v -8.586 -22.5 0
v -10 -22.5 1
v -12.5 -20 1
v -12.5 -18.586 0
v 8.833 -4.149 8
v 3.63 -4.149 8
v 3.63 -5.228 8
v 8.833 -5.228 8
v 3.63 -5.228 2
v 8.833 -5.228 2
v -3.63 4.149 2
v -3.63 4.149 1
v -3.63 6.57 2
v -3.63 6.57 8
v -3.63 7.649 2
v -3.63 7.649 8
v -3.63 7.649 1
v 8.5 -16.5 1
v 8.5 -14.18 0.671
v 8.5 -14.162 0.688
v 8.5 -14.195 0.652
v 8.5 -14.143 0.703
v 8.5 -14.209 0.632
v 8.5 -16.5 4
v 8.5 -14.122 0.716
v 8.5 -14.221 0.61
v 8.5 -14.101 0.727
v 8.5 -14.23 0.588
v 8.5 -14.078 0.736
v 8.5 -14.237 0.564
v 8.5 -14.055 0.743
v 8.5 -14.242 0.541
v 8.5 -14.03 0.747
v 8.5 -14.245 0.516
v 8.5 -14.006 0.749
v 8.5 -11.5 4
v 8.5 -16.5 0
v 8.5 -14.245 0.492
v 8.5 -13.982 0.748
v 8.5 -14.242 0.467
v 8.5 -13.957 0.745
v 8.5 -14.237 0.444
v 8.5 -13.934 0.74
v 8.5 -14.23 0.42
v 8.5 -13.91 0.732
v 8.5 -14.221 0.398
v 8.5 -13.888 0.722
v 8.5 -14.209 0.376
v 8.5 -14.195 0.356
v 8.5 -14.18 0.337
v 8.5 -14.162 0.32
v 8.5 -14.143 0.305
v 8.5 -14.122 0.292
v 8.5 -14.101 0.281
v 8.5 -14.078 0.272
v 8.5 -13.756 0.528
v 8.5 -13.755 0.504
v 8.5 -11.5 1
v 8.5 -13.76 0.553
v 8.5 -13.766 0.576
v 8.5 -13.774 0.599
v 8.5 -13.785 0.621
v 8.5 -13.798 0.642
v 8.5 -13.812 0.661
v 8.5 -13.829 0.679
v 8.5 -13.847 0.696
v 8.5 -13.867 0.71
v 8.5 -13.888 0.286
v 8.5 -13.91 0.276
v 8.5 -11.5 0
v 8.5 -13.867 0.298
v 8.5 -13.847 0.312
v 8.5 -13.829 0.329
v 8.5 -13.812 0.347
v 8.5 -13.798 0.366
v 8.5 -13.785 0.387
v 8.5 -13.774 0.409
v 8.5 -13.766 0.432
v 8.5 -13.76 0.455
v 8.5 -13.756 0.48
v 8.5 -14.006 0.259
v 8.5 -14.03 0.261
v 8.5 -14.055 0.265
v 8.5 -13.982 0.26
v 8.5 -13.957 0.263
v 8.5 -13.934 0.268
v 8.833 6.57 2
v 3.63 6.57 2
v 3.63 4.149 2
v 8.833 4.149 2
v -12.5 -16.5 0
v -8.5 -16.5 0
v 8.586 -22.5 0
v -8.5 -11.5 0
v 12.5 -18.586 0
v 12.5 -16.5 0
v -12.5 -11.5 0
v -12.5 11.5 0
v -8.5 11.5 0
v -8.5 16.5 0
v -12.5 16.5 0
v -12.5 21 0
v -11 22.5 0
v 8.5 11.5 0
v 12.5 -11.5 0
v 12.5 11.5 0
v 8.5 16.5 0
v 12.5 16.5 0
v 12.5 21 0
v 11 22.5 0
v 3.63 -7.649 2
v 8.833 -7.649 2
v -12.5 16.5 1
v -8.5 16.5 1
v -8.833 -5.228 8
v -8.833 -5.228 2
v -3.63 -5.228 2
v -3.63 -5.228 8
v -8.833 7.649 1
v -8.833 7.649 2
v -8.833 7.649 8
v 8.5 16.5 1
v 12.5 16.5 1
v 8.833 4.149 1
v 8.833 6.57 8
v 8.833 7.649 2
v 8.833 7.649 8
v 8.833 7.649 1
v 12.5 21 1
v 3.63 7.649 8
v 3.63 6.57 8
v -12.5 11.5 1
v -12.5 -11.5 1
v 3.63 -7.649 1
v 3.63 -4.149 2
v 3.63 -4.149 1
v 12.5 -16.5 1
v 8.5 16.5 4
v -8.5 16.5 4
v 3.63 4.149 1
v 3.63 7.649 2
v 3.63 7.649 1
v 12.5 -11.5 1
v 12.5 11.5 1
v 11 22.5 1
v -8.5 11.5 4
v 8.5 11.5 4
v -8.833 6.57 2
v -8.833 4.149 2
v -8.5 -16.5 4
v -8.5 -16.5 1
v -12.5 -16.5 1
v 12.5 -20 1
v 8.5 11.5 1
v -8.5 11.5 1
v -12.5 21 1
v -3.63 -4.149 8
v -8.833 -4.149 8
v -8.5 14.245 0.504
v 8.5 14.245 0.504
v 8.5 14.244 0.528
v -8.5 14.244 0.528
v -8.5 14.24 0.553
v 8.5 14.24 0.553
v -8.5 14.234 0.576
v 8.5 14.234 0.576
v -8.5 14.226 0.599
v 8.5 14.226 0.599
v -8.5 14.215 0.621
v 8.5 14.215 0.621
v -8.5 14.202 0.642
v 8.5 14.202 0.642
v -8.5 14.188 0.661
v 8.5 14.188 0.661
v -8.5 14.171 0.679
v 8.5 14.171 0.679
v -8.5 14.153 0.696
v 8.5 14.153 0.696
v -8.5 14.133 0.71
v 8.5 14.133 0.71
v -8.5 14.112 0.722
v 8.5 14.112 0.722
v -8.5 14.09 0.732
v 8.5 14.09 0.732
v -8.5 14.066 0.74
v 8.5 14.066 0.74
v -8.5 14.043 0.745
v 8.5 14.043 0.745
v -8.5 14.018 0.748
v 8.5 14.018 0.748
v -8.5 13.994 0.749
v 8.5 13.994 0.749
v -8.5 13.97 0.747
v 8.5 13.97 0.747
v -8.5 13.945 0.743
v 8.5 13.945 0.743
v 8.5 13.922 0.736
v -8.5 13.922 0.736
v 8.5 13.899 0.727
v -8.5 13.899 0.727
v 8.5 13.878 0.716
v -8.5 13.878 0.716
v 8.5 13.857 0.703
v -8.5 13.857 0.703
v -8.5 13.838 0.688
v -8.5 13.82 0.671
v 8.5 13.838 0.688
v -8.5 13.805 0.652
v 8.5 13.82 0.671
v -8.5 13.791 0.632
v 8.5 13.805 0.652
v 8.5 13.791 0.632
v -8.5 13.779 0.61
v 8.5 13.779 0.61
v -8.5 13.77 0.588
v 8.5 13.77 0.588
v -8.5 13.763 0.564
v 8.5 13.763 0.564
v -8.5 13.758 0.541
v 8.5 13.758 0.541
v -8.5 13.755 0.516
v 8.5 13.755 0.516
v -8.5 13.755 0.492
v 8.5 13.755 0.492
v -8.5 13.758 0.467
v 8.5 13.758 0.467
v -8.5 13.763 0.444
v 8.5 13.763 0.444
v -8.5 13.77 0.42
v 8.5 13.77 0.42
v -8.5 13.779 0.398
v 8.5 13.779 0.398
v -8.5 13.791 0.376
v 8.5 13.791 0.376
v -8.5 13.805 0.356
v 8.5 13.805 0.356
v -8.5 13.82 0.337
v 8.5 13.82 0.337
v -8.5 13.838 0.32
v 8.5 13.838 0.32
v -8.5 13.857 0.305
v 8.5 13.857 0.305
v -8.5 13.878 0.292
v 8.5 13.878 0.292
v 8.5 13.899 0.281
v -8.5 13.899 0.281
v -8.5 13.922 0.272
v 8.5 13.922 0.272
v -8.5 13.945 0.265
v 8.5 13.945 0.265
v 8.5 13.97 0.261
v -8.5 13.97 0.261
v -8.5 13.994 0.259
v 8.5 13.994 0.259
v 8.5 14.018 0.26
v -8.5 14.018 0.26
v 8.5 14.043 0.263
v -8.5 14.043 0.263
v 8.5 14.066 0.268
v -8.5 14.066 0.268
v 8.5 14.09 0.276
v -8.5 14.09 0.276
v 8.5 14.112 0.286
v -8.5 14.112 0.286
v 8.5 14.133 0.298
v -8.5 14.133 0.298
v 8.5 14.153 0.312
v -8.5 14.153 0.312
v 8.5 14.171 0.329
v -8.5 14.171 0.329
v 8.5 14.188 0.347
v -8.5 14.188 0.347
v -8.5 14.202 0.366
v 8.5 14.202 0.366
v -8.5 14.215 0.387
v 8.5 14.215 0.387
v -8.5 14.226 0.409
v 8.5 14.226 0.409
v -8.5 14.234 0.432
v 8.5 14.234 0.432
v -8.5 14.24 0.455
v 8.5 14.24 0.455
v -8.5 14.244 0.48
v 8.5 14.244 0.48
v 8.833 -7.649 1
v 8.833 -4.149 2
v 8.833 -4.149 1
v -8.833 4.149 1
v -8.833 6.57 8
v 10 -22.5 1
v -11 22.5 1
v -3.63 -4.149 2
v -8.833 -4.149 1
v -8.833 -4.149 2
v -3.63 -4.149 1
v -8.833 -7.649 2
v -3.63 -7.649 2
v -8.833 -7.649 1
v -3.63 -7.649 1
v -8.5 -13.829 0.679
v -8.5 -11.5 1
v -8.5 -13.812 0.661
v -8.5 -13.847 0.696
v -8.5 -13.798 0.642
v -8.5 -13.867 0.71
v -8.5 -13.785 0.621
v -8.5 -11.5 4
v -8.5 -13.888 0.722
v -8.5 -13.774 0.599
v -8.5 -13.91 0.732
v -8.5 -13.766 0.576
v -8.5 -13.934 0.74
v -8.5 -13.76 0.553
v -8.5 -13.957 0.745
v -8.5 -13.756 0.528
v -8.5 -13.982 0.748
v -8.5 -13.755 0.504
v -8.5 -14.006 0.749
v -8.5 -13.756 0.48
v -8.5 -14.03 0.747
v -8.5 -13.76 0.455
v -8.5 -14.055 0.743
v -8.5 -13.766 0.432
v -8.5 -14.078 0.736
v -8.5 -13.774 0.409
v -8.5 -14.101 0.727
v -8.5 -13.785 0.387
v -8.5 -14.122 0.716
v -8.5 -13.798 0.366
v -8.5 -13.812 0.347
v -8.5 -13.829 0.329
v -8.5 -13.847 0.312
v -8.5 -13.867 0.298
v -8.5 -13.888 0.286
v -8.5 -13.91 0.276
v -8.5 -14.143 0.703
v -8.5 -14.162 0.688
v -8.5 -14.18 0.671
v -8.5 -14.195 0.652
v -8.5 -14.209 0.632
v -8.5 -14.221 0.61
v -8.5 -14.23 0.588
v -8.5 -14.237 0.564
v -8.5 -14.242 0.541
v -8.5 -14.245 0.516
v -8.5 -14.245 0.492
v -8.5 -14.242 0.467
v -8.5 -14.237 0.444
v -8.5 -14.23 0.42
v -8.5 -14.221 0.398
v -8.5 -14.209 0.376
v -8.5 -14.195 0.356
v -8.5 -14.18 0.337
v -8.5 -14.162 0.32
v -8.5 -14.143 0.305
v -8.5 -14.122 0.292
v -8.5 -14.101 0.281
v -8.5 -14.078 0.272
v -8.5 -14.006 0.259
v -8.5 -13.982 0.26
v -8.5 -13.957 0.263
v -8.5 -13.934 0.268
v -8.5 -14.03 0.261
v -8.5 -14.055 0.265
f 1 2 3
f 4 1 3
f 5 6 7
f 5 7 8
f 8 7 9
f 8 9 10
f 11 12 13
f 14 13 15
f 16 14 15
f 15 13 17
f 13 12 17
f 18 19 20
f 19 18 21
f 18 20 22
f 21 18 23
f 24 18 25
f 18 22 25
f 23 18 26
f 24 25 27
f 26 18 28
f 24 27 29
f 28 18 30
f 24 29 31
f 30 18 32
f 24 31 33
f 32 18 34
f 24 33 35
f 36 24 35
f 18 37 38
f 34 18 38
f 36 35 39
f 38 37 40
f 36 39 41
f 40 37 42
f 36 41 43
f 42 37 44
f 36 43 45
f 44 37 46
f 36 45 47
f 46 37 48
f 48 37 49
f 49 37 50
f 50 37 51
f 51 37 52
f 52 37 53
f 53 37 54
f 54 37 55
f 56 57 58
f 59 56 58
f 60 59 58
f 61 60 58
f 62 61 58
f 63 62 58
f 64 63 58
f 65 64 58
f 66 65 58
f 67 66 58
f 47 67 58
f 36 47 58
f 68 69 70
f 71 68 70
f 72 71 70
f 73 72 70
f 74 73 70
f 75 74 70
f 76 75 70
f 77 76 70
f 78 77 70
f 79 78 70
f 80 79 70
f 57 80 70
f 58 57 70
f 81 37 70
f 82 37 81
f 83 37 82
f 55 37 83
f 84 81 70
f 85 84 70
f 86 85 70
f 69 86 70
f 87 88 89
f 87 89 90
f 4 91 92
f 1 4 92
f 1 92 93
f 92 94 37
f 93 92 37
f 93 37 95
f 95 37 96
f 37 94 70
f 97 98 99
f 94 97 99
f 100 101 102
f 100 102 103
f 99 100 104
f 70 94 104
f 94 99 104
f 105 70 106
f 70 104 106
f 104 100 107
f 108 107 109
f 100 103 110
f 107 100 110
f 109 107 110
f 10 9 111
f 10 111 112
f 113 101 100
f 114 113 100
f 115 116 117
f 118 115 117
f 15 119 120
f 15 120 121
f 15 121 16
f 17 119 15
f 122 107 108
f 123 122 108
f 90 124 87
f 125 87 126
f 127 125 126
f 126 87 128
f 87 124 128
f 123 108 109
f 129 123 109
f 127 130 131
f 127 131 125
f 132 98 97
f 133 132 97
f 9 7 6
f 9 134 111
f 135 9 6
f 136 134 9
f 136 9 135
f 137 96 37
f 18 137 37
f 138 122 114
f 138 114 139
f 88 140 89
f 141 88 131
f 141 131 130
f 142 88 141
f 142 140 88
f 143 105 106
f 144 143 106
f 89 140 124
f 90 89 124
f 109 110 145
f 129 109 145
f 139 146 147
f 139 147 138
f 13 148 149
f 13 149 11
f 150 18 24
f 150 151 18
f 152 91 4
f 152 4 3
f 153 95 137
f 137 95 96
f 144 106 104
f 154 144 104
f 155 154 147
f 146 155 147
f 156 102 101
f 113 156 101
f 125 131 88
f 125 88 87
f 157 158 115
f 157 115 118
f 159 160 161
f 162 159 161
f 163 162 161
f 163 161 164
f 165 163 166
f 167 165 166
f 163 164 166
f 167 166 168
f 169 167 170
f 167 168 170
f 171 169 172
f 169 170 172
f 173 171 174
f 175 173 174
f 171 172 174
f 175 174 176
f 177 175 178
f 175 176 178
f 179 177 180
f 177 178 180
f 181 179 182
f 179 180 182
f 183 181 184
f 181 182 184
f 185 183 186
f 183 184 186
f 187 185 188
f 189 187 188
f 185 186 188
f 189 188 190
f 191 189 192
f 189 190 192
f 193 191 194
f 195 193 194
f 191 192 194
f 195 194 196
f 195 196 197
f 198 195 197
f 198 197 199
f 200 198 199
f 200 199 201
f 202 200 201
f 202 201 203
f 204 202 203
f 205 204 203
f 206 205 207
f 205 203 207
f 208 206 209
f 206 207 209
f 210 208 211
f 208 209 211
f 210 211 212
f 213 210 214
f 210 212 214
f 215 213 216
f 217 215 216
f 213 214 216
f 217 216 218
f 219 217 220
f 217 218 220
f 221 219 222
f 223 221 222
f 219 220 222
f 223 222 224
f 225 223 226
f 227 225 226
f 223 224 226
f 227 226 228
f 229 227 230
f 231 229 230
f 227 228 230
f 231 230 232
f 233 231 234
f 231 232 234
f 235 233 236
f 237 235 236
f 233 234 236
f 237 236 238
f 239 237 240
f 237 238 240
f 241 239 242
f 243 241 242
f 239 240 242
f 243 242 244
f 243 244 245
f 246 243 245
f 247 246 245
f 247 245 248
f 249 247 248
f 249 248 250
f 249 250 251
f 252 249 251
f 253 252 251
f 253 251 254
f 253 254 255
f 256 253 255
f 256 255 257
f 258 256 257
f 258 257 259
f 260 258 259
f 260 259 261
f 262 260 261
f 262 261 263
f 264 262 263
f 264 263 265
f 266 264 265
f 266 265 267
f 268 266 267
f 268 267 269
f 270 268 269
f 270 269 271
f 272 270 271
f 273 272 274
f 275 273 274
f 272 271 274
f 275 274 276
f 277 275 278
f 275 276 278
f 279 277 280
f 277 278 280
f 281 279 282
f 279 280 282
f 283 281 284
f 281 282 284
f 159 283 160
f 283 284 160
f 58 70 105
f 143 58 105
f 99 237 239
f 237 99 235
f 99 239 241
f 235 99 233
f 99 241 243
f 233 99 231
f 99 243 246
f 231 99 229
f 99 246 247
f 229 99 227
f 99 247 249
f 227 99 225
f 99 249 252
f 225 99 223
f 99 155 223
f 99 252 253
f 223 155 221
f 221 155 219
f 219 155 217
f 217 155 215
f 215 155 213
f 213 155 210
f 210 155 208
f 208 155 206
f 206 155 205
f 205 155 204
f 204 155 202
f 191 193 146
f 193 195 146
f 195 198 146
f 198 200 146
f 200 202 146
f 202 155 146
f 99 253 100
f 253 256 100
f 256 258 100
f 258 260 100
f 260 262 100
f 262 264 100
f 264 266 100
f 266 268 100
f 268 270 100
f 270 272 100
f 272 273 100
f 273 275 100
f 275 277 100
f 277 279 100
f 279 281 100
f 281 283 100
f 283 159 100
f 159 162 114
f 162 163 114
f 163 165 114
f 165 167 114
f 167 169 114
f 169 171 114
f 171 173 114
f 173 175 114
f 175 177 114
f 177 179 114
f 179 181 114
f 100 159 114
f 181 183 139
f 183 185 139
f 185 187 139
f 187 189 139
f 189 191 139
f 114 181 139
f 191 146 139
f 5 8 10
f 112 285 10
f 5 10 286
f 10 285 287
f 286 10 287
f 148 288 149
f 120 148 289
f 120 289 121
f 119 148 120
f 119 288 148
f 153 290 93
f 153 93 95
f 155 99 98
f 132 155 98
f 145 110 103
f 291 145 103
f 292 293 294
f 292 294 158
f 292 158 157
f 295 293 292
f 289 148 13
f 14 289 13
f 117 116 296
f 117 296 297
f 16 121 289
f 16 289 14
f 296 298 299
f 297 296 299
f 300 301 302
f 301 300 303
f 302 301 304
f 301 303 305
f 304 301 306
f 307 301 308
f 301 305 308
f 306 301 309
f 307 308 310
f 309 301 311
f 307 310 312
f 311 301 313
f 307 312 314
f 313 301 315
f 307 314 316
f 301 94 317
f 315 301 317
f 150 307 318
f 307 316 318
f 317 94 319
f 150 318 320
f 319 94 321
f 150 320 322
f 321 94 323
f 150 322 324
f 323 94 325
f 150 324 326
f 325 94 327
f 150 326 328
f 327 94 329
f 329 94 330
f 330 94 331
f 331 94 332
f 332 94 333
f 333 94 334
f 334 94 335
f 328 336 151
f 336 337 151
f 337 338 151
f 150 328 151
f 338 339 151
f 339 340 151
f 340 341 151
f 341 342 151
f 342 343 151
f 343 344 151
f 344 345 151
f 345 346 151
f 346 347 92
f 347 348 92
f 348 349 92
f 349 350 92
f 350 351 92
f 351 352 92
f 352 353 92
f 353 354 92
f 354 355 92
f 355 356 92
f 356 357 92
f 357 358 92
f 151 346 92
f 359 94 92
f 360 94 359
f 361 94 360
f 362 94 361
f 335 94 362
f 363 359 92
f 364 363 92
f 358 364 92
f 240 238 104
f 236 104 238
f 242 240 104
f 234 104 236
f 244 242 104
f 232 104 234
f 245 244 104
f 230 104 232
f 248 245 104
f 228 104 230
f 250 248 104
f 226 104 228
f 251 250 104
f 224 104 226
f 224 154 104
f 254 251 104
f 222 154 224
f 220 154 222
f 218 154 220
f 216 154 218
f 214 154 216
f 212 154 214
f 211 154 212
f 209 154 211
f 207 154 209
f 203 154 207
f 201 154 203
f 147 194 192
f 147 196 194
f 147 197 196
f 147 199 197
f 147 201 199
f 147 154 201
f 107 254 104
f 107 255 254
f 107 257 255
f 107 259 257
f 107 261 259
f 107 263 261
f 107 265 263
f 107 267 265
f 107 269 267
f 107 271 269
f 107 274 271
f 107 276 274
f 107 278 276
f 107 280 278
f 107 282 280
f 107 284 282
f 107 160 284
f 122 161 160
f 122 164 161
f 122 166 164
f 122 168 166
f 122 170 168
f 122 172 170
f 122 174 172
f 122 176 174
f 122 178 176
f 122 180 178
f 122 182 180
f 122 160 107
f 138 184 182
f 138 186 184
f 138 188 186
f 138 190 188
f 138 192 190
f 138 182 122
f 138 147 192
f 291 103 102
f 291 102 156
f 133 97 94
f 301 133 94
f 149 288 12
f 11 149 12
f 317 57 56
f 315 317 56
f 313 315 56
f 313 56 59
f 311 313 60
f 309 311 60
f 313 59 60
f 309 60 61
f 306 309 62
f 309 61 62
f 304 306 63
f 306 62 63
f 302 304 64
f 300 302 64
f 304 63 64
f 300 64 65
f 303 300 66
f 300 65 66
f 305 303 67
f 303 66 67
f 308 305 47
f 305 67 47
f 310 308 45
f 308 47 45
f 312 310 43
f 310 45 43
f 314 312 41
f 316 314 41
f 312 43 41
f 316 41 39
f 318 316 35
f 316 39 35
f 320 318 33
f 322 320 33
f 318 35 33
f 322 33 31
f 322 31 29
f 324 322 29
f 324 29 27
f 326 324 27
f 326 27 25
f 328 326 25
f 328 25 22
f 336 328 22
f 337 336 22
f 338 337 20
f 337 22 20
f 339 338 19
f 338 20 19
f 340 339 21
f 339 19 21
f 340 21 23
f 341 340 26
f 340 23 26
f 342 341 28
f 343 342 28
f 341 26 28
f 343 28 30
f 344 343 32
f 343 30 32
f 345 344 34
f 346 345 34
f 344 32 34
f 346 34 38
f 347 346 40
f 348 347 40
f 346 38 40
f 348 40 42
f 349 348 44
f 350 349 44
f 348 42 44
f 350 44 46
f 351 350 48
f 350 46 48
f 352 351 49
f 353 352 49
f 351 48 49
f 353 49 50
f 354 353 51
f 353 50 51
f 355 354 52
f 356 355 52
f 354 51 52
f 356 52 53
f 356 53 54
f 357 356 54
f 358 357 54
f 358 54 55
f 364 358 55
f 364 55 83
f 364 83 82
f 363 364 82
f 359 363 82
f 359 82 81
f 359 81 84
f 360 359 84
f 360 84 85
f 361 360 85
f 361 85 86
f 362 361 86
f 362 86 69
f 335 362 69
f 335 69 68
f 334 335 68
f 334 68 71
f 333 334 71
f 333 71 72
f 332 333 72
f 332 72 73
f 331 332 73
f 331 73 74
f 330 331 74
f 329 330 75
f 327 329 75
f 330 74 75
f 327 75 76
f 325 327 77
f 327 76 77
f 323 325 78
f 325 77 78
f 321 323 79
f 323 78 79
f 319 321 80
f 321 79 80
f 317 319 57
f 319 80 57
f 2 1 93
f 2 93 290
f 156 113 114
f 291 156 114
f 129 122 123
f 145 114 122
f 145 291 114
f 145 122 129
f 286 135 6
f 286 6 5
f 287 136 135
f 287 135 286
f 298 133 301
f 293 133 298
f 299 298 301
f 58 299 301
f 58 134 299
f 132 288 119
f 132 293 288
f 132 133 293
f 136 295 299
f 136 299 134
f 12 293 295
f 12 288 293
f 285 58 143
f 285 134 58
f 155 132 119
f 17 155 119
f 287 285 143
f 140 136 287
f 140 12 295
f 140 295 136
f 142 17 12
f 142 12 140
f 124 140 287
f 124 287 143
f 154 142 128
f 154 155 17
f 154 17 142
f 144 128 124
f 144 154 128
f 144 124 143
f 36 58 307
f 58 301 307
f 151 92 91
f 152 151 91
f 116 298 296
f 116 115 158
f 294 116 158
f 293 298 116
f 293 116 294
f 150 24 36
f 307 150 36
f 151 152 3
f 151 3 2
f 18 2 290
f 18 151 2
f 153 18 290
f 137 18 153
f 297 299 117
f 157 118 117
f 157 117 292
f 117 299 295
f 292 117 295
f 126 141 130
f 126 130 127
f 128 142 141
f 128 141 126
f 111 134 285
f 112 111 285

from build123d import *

# Parameters (mm, degrees)
F1_DEPTH  = 1
F2_W      = 5
F2_H      = 3
F3_DEPTH  = 8.5
F4_SIZE   = 2.5
F5_SIZE   = 1.5
F6_SIZE   = 0.99999
F7_R      = 0.245
F8_DEPTH  = 17
F9_W      = 5.2027019071
F9_H      = 3.5
F10_DEPTH = 1
F11_W     = 5.2027019071
F11_H     = 1.0782994613
F12_DEPTH = 6
F13_W     = 5.2027019071
F13_H     = 1.0795953252
F14_DEPTH = 6


# Not quite as in the source:
# - a fillet or chamfer is up to 0.001 mm smaller than in the source, because OpenCascade refuses the exact size


with BuildPart() as f1:
    # F0 (on Top) → F1 (new body)
    with BuildSketch(Plane.XY):
        Polygon((-12.5, -22.5), (12.5, -22.5), (12.5, -16.5), (8.5, -16.5), (8.5, -11.5), (12.5, -11.5), (12.5, 11.5), (8.5, 11.5), (8.5, 16.5), (12.5, 16.5), (12.5, 22.5), (-12.5, 22.5), (-12.5, 16.5), (-8.5, 16.5), (-8.5, 11.5), (-12.5, 11.5), (-12.5, -11.5), (-8.5, -11.5), (-8.5, -16.5), (-12.5, -16.5), align=None)
    extrude(amount=F1_DEPTH)

    # F2 (on Right) → F3 (join, symmetric)
    with BuildSketch(Plane.YZ):
        with Locations((-14, 2.5)):
            Rectangle(F2_W, F2_H)
        with Locations((14, 2.5)):
            Rectangle(F2_W, F2_H)
    extrude(amount=F3_DEPTH, both=True)

    # F4
    f4_edges = [f1.edges().sort_by_distance(p)[0] for p in [
        (12.5, -22.5, 0.5),
        (-12.5, -22.5, 0.5),
    ]]
    chamfer(f4_edges, length=F4_SIZE)

    # F5
    f5_edges = [f1.edges().sort_by_distance(p)[0] for p in [
        (12.5, 22.5, 0.5),
        (-12.5, 22.5, 0.5),
    ]]
    chamfer(f5_edges, length=F5_SIZE)

    # F6 (size 1 in the source; OpenCascade refuses exactly that, so slightly less here)
    f6_edges = [f1.edges().sort_by_distance(p)[0] for p in [
        (-11.25, -21.25, 0),
        (11.25, -21.25, 0),
    ]]
    chamfer(f6_edges, length=F6_SIZE)

    # F7 (on face) → F8 (cut)
    with BuildSketch(Plane.YZ.offset(8.5)):
        with Locations((-14, 0.5039868411)):
            Circle(F7_R)
        with Locations((14, 0.5039868411)):
            Circle(F7_R)
    extrude(amount=-F8_DEPTH, mode=Mode.SUBTRACT)

    # F9 (on face) → F10 (join)
    with BuildSketch(Plane.XY.offset(1)):
        with Locations((6.2317421885, -5.8993692152)):
            Rectangle(F9_W, F9_H)
        with Locations((-6.2317421885, -5.8993692152)):
            Rectangle(F9_W, F9_H)
        with Locations((-6.2317421885, 5.8993692152)):
            Rectangle(F9_W, F9_H)
        with Locations((6.2317421885, 5.8993692152)):
            Rectangle(F9_W, F9_H)
    extrude(amount=F10_DEPTH)

    # F11 (on face) → F12 (join)
    with BuildSketch(Plane.XY.offset(2)):
        with Locations((6.2317421885, -4.6885189459)):
            Rectangle(F11_W, F11_H)
        with Locations((-6.2317421885, -4.6885189459)):
            Rectangle(F11_W, F11_H)
    extrude(amount=F12_DEPTH)

    # F13 (on face) → F14 (join)
    with BuildSketch(Plane.XY.offset(2)):
        with Locations((6.2317421885, 7.1095715527)):
            Rectangle(F13_W, F13_H)
        with Locations((-6.2317421885, 7.1095715527)):
            Rectangle(F13_W, F13_H)
    extrude(amount=F14_DEPTH)


solid = f1.part
